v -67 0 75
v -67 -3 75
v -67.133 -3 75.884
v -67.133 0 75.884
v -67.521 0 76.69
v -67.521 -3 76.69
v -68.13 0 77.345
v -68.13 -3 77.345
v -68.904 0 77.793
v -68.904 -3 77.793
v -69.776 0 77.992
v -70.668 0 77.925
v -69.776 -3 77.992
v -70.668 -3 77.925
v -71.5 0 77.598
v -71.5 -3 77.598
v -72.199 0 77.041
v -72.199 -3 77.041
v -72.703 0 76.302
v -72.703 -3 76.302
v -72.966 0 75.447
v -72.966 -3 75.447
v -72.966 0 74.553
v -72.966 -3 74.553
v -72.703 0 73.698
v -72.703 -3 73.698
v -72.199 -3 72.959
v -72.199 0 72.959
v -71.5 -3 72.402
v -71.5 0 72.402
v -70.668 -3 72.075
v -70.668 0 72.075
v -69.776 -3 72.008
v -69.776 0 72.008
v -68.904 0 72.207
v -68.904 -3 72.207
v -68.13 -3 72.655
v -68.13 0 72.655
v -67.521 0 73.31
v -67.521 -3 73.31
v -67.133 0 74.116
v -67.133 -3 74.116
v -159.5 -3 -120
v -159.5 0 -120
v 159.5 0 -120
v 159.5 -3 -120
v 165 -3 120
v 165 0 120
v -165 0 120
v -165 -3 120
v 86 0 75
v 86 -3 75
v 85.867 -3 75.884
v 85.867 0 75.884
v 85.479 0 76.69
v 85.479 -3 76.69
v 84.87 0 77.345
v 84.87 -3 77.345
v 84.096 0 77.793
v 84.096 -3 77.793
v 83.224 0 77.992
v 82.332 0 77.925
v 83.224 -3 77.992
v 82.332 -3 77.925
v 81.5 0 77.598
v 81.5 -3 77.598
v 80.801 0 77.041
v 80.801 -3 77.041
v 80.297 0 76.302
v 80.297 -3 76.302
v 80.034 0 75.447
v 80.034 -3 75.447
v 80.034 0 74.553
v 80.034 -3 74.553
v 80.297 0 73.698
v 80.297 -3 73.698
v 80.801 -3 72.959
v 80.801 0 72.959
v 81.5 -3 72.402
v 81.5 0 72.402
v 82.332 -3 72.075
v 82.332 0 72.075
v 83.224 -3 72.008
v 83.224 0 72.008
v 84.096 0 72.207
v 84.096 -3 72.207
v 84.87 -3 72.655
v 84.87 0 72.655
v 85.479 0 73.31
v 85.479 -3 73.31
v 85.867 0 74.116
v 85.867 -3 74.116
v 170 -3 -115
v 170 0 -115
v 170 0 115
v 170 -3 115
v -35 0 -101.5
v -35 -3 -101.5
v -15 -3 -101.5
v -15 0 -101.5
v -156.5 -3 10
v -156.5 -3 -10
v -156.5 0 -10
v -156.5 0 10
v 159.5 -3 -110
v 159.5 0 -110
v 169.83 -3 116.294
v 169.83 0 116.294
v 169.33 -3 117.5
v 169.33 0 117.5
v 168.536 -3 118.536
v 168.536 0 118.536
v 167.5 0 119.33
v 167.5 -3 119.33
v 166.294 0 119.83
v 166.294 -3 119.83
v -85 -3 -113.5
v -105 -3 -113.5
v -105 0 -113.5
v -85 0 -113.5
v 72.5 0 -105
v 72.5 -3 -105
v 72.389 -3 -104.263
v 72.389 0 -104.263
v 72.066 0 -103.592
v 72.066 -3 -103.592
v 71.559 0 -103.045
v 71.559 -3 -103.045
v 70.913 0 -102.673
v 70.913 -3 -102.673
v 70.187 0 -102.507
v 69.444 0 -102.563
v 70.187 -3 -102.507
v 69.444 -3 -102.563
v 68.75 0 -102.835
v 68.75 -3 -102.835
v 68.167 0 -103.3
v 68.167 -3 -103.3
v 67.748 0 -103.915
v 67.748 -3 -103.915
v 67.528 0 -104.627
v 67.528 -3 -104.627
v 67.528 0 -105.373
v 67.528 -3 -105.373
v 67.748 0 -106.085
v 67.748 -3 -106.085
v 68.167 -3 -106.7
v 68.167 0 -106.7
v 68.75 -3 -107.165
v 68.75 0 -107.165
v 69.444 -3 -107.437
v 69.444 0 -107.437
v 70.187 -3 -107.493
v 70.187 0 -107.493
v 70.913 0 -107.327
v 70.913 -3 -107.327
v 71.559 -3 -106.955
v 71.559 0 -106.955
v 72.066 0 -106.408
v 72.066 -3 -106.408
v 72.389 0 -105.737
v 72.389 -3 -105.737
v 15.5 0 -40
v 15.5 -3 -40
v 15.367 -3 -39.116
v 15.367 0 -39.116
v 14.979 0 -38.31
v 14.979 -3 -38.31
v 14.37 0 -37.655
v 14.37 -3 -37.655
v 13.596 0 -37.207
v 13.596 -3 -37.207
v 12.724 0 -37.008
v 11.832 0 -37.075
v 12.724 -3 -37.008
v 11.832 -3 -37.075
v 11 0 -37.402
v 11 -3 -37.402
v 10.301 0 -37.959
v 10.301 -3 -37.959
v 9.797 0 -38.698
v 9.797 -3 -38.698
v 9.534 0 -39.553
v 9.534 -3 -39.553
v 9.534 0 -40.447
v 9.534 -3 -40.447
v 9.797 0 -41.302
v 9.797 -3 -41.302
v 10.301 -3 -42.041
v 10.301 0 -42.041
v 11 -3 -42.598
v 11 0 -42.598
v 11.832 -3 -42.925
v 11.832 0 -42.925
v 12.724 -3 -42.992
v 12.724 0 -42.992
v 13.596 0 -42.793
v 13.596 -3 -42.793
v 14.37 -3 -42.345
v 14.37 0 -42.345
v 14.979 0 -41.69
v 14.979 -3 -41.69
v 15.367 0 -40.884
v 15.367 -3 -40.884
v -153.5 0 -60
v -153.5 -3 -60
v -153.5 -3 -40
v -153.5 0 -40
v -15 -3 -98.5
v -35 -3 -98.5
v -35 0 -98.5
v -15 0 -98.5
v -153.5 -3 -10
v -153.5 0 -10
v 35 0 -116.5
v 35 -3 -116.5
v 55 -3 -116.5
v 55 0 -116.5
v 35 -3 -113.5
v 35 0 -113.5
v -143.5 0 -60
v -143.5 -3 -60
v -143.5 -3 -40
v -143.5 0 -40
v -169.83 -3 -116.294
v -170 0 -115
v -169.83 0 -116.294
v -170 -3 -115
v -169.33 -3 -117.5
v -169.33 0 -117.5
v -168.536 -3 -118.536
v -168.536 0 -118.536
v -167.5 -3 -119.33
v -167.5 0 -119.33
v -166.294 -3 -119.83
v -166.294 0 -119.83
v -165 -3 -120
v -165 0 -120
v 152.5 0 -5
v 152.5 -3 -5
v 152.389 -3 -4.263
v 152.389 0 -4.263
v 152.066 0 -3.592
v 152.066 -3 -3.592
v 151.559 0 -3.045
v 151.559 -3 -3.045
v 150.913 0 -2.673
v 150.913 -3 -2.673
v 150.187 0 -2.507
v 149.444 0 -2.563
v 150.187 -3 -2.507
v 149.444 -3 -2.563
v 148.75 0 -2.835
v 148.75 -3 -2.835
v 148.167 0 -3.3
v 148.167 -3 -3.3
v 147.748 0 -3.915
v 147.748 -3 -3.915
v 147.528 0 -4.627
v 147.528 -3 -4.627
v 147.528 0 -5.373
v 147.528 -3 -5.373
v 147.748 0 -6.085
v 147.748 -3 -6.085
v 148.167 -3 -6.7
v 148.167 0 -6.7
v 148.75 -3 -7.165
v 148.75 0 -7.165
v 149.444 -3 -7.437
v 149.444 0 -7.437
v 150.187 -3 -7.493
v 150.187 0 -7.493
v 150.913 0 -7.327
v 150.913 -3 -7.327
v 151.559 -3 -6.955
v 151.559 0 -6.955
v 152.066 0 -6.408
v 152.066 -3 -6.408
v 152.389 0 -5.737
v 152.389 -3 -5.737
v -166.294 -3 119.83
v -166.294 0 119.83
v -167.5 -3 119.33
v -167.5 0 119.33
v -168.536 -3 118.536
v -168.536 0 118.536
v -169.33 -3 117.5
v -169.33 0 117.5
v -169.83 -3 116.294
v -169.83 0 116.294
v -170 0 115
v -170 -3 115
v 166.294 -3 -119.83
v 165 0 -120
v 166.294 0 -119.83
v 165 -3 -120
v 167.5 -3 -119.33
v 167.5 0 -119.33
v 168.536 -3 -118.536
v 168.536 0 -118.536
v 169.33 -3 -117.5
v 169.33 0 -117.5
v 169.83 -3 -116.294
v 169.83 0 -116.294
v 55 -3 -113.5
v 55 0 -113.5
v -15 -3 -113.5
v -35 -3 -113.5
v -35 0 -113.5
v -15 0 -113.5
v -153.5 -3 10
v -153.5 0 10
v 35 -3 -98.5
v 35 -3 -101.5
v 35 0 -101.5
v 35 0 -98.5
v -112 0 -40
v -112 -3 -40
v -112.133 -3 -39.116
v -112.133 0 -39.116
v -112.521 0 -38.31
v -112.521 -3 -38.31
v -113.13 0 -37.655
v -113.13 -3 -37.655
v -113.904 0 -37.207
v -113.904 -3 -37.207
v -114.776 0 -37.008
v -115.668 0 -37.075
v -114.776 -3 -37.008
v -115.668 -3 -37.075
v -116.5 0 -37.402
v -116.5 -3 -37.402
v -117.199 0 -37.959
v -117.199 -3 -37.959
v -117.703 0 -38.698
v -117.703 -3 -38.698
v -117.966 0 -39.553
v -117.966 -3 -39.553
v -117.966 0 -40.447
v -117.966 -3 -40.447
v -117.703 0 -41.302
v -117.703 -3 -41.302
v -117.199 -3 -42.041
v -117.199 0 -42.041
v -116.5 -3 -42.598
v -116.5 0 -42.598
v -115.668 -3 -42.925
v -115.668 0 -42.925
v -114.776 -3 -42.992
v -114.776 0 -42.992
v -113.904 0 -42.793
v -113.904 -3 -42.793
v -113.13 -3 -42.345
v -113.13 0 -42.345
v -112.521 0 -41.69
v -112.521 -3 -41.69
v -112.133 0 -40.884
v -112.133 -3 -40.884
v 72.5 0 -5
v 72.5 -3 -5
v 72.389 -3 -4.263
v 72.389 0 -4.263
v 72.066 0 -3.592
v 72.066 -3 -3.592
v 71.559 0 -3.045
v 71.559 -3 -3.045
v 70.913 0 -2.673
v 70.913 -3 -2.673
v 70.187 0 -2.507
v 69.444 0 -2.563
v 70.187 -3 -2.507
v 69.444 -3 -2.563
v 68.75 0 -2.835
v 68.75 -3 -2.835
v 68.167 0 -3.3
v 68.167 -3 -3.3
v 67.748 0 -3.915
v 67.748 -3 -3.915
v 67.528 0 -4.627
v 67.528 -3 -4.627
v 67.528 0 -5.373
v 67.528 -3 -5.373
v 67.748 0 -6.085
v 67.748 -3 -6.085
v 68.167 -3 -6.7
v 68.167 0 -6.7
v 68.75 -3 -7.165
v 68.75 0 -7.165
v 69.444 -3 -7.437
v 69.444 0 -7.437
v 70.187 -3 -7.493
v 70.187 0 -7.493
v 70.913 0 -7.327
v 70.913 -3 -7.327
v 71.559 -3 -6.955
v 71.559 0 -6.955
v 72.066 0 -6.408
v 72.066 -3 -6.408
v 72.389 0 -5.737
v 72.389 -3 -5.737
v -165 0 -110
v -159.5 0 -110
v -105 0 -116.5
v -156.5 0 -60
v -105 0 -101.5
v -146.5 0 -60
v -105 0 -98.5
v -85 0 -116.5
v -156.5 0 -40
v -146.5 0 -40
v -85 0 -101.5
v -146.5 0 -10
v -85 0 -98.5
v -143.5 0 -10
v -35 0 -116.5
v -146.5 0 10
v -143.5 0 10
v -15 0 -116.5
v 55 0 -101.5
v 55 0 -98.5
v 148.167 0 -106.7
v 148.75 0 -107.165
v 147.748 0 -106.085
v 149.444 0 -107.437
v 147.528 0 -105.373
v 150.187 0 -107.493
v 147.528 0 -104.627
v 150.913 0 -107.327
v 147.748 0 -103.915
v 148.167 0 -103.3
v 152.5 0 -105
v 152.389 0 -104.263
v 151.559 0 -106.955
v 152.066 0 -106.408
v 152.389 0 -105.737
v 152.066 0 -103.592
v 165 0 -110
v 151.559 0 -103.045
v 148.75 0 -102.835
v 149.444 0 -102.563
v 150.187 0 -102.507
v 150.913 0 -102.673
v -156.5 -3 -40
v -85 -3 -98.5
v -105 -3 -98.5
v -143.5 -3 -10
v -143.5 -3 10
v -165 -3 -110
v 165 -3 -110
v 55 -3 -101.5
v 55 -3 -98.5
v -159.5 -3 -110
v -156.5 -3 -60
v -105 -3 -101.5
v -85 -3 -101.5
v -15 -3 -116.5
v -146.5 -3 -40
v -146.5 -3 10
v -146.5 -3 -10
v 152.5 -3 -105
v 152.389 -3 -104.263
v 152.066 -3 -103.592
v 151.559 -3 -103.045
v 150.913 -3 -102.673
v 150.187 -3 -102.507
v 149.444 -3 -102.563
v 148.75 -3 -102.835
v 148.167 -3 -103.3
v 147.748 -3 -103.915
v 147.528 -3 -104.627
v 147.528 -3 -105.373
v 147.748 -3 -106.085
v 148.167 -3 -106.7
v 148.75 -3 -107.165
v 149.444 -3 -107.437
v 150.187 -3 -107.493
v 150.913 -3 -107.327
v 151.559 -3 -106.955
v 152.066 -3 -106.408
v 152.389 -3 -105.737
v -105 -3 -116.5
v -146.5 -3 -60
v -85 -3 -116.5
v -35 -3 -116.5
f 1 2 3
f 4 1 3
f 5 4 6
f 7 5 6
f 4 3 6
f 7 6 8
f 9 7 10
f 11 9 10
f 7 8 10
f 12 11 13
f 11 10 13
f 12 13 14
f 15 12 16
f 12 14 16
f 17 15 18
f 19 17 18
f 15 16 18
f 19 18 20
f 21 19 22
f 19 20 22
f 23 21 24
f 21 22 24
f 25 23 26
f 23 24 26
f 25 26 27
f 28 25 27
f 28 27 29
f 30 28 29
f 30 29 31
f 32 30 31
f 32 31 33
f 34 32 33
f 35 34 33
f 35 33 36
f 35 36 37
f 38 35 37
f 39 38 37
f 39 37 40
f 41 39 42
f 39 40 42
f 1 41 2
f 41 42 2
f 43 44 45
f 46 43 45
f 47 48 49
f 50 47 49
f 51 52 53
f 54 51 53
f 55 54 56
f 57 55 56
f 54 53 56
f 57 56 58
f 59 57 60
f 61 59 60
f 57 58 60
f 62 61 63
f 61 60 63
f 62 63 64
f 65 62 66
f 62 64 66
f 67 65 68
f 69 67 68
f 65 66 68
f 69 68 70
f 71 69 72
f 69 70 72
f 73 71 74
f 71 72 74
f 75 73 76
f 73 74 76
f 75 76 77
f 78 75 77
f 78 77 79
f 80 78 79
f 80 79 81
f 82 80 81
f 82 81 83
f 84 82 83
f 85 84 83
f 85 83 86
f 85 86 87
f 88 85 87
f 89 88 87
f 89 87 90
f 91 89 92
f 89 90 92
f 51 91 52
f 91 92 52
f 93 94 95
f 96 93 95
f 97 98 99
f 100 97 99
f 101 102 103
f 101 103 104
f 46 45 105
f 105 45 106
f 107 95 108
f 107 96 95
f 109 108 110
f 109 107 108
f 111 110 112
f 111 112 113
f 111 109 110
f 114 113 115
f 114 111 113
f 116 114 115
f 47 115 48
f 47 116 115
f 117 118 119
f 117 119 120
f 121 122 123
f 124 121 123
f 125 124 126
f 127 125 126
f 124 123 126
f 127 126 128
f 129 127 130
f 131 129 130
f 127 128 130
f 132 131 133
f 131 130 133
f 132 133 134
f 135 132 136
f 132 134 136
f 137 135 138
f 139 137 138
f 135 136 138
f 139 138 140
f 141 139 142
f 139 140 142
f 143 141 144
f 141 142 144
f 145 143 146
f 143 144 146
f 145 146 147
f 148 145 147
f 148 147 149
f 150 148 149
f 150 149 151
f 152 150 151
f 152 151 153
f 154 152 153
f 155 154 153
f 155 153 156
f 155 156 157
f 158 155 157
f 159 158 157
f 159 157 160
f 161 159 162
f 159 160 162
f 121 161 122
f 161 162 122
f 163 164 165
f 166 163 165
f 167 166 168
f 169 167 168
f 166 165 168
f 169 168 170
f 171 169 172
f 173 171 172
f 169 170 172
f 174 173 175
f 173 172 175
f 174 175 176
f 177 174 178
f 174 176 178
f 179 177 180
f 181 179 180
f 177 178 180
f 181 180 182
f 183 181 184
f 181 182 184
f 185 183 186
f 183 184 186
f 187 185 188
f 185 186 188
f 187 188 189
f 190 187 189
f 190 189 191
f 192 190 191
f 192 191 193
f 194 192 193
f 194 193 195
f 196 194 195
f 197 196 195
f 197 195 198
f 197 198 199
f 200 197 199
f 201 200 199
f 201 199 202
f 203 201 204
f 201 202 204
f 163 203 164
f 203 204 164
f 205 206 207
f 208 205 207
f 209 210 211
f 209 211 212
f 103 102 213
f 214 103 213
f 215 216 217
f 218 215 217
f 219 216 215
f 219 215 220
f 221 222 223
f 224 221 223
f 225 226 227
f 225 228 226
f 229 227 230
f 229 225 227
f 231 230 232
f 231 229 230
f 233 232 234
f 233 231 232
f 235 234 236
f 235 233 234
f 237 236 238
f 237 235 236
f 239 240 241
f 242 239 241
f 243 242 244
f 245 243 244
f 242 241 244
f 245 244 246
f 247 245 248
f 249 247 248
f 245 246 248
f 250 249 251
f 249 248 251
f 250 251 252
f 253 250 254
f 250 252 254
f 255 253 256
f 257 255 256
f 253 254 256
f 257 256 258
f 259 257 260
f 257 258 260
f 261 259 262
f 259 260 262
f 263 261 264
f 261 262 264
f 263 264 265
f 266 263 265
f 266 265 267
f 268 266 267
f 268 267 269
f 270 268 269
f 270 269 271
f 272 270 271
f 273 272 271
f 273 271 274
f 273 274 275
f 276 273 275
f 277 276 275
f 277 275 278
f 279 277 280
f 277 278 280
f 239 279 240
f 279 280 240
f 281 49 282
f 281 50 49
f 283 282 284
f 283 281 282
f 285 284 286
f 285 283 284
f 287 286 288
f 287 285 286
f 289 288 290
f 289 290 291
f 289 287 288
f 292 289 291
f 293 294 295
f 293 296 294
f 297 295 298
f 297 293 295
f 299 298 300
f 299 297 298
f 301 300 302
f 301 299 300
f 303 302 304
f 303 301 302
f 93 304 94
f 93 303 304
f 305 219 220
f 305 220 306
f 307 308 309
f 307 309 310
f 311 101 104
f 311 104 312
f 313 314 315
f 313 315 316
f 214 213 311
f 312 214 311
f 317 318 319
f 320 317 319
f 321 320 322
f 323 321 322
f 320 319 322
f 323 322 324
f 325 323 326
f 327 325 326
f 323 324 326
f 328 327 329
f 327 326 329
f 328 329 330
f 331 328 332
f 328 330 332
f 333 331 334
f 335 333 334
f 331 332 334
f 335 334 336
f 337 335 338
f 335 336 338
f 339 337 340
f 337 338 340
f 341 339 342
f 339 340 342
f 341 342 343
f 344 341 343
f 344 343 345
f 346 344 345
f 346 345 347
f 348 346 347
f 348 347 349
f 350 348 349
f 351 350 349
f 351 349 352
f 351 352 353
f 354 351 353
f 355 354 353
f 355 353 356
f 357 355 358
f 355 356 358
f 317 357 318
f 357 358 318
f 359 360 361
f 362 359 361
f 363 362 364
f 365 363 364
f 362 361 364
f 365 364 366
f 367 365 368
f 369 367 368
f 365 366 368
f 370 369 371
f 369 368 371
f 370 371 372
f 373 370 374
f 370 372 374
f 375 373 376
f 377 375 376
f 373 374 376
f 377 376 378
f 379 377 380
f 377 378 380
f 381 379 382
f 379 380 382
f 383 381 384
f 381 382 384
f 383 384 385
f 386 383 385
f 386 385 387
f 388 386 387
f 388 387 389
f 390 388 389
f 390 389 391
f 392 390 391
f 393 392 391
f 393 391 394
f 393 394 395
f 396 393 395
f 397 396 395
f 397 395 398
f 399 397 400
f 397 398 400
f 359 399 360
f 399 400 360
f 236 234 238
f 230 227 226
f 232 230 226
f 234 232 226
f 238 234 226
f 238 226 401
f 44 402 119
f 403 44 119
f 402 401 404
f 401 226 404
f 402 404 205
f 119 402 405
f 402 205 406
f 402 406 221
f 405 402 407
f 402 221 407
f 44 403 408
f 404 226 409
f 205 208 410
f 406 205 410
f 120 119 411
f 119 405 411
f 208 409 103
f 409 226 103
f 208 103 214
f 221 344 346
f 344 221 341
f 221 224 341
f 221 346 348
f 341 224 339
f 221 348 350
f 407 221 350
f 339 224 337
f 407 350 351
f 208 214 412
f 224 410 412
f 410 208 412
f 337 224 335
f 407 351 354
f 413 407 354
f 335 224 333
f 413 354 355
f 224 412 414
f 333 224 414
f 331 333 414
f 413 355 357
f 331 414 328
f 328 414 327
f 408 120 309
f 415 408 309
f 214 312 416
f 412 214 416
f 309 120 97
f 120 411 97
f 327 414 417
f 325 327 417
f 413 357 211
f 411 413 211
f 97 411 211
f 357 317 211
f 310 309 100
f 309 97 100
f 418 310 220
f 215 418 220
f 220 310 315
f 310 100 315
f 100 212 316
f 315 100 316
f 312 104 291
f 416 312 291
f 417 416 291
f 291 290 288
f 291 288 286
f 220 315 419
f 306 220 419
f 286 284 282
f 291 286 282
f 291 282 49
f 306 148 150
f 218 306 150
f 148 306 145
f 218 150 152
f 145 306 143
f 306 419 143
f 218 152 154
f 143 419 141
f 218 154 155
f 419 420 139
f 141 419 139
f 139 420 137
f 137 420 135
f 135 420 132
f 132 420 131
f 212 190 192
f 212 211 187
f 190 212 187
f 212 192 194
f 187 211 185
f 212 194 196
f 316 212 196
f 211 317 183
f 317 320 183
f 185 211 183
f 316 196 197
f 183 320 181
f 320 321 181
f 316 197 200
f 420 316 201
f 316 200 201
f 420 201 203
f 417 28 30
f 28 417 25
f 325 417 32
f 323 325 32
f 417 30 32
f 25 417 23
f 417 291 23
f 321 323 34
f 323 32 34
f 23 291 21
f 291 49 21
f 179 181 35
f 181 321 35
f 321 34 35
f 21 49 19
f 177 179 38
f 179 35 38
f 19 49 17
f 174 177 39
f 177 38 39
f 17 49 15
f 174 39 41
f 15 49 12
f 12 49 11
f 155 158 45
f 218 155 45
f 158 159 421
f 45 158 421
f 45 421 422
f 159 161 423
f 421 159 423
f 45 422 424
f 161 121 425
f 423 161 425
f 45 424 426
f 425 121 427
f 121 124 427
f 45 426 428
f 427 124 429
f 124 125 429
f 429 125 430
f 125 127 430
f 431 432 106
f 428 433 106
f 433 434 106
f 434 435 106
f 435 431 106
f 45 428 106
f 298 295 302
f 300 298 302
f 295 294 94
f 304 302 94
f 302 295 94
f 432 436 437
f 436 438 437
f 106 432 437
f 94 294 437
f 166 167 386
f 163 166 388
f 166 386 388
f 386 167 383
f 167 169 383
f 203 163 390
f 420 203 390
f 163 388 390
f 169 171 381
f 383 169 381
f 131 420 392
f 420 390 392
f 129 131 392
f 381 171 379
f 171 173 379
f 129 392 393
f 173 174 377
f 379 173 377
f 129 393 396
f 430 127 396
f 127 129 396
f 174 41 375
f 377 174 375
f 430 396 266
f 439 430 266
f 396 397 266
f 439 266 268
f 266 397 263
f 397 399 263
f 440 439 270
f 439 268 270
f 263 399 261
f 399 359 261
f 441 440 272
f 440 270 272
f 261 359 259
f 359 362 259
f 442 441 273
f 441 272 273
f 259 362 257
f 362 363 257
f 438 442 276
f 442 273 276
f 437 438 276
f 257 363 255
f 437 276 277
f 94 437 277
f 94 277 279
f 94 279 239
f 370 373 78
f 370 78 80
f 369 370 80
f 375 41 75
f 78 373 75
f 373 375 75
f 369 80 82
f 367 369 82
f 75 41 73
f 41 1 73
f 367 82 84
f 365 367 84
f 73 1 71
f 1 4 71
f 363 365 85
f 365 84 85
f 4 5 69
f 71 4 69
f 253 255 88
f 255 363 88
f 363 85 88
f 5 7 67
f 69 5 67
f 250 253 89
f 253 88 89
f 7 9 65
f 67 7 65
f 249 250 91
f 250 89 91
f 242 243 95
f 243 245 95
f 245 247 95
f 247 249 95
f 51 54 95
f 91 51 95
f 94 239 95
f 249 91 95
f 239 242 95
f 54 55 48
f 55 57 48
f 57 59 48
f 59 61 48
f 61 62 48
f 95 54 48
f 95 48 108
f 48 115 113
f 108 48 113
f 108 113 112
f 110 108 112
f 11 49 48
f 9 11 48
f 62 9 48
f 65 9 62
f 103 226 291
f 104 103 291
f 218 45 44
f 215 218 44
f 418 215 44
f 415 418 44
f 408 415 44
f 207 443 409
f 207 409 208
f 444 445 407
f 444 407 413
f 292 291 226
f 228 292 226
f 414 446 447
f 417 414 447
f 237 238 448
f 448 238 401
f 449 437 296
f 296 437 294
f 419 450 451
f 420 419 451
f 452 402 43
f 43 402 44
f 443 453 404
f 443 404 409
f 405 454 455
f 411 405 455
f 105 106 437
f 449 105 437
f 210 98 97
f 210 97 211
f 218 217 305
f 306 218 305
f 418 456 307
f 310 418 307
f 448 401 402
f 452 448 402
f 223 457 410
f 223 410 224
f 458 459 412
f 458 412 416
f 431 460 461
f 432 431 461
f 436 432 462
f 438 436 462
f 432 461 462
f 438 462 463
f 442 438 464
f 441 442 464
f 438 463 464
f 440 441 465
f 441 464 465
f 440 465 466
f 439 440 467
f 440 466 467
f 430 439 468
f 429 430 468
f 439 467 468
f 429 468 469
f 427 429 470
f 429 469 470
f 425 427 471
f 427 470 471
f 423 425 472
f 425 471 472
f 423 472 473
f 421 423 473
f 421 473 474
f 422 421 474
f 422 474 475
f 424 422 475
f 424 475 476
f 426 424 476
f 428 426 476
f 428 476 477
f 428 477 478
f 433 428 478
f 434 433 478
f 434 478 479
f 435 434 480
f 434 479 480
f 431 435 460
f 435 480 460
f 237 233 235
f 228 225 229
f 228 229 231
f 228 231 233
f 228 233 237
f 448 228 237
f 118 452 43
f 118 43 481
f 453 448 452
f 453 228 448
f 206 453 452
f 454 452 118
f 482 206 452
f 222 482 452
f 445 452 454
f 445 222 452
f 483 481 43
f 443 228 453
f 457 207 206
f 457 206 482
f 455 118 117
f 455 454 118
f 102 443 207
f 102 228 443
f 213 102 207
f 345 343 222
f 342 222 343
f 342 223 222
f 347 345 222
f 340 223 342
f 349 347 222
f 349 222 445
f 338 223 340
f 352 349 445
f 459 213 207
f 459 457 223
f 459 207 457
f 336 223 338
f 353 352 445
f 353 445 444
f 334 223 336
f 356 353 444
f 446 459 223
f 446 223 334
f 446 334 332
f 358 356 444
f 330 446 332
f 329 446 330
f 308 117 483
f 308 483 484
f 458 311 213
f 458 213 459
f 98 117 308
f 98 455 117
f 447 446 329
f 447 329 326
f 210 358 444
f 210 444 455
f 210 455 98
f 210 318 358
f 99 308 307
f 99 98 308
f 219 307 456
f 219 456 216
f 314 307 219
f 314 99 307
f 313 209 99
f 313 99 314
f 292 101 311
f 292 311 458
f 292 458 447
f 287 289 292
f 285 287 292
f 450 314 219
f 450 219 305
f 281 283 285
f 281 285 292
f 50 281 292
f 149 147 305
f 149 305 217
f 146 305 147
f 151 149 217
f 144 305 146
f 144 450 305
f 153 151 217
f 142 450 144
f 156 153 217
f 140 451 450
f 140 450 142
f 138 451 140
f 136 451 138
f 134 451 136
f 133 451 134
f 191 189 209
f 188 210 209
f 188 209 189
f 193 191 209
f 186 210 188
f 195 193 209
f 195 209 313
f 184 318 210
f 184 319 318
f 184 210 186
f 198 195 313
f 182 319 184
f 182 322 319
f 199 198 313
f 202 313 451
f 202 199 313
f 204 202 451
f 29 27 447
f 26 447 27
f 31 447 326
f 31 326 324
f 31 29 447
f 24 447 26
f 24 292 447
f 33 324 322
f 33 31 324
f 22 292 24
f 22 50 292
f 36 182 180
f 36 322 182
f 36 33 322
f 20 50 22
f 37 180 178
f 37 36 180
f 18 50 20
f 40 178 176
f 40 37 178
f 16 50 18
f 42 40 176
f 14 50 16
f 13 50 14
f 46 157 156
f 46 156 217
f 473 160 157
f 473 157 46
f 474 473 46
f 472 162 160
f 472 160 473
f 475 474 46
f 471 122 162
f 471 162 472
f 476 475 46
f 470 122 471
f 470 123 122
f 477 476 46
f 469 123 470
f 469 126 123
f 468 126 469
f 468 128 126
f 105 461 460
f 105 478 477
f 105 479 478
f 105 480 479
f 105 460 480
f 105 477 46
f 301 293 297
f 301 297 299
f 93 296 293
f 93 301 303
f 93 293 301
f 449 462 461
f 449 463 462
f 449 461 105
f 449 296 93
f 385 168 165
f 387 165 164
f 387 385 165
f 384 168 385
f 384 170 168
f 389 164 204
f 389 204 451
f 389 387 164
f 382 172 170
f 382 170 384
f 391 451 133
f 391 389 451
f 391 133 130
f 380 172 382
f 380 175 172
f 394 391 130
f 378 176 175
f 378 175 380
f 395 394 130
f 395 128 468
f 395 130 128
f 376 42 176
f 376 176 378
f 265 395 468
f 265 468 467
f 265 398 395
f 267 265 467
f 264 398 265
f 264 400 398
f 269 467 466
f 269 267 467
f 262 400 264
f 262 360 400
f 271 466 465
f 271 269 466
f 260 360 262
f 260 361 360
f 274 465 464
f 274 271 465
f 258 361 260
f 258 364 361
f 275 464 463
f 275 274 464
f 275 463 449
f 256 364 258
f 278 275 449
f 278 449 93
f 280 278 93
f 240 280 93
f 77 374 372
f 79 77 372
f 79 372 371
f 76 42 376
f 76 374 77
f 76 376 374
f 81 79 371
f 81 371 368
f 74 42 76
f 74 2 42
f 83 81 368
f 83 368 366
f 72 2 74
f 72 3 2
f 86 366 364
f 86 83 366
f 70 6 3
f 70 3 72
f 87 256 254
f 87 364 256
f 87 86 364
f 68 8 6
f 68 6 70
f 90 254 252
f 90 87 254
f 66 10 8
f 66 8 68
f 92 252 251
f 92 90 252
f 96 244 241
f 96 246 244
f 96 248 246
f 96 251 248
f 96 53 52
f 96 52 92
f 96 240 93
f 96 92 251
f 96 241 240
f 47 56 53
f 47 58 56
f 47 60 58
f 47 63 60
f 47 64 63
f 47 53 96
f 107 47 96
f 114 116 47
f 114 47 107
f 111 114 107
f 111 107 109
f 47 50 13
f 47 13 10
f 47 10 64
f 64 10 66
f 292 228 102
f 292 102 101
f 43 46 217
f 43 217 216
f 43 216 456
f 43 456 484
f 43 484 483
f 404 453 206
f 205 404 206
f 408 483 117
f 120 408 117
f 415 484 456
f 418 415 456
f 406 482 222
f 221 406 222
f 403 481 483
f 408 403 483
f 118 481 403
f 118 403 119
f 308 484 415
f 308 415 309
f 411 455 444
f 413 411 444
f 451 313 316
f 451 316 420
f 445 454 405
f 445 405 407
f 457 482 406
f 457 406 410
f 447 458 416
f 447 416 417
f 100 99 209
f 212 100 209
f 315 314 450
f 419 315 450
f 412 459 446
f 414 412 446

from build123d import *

# Parameters (mm, degrees)
F1_DEPTH = 3
F2_R     = 3
F3_DEPTH = 3
F4_R     = 2.5
F5_DEPTH = 3
F6_W     = 20
F6_H     = 3
F6_W_2   = 3
F6_H_2   = 20
F7_DEPTH = 3
F8_R     = 4.99999


# Not quite as in the source:
# - a fillet or chamfer is up to 0.001 mm smaller than in the source, because OpenCascade refuses the exact size


with BuildPart() as f1:
    # F0 (on Front) → F1 (new body)
    with BuildSketch(Plane.XZ):
        Polygon((165, -120), (170, -120), (170, 120), (-170, 120), (-170, -120), (-165, -120), (-165, -110), (-159.5, -110), (-159.5, -120), (159.5, -120), (159.5, -110), (165, -110), align=None)
    extrude(amount=F1_DEPTH)

    # F2 (on face) → F3 (cut, through all)
    with BuildSketch(Plane.XZ.offset(3)):
        with Locations((-70, 75)):
            Circle(F2_R)
        with Locations((83, 75)):
            Circle(F2_R)
        with Locations((12.5, -40)):
            Circle(F2_R)
        with Locations((-115, -40)):
            Circle(F2_R)
    extrude(amount=-F3_DEPTH, mode=Mode.SUBTRACT)

    # F4 (on face) → F5 (cut, through all)
    with BuildSketch(Plane.XZ.offset(3)):
        with Locations((70, -5)):
            Circle(F4_R)
        with Locations((150, -5)):
            Circle(F4_R)
        with Locations((150, -105)):
            Circle(F4_R)
        with Locations((70, -105)):
            Circle(F4_R)
    extrude(amount=-F5_DEPTH, mode=Mode.SUBTRACT)

    # F6 (on face) → F7 (cut, through all)
    with BuildSketch(Plane.XZ.offset(3)):
        with Locations((-95, -100)):
            Rectangle(F6_W, F6_H)
        with Locations((-25, -100)):
            Rectangle(F6_W, F6_H)
        with Locations((45, -100)):
            Rectangle(F6_W, F6_H)
        with Locations((-95, -115)):
            Rectangle(F6_W, F6_H)
        with Locations((-25, -115)):
            Rectangle(F6_W, F6_H)
        with Locations((45, -115)):
            Rectangle(F6_W, F6_H)
        with Locations((-155, 0)):
            Rectangle(F6_W_2, F6_H_2)
        with Locations((-145, 0)):
            Rectangle(F6_W_2, F6_H_2)
        with Locations((-155, -50)):
            Rectangle(F6_W_2, F6_H_2)
        with Locations((-145, -50)):
            Rectangle(F6_W_2, F6_H_2)
    extrude(amount=-F7_DEPTH, mode=Mode.SUBTRACT)

    # F8 (radius 5 in the source; OpenCascade refuses exactly that, so slightly less here)
    f8_edges = [f1.edges().sort_by_distance(p)[0] for p in [
        (-170, -1.5, 120),
        (170, -1.5, 120),
        (170, -1.5, -120),
        (-170, -1.5, -120),
    ]]
    fillet(f8_edges, radius=F8_R)


solid = f1.part
